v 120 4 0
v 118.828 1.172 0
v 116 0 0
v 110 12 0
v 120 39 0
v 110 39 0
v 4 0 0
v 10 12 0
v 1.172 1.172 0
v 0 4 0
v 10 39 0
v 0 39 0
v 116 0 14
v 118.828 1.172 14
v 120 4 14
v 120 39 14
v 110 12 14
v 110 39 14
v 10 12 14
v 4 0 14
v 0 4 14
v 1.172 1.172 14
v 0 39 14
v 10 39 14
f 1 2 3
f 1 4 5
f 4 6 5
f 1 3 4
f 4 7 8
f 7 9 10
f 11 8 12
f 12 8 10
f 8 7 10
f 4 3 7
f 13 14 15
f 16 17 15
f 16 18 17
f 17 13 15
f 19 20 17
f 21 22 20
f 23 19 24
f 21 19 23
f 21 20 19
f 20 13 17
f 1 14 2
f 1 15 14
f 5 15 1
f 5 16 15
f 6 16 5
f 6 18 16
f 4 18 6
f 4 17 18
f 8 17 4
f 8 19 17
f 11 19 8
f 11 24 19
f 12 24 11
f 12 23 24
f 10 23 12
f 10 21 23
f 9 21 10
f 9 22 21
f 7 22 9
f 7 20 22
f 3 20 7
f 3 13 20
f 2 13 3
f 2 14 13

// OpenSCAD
$fn = 32;

// ----------------------------------------------------------------------
// Heat sink frame: 120 x 39 mm frame, 10 mm walls
// ----------------------------------------------------------------------

// --- parameters (mm) ---
profile_height = 14;      // extrusion height
profile_points = 12;      // points of the closed outline

profile = [[0, 4], [1.172, 1.172], [4, 0], [116, 0], [118.828, 1.172], [120, 4], [120, 39], [110, 39], [110, 12], [10, 12], [10, 39], [0, 39]];  // single closed polygon, 12 points, counter clockwise

// --- the one profile operation ---
linear_extrude(height = profile_height) polygon(points = profile);
